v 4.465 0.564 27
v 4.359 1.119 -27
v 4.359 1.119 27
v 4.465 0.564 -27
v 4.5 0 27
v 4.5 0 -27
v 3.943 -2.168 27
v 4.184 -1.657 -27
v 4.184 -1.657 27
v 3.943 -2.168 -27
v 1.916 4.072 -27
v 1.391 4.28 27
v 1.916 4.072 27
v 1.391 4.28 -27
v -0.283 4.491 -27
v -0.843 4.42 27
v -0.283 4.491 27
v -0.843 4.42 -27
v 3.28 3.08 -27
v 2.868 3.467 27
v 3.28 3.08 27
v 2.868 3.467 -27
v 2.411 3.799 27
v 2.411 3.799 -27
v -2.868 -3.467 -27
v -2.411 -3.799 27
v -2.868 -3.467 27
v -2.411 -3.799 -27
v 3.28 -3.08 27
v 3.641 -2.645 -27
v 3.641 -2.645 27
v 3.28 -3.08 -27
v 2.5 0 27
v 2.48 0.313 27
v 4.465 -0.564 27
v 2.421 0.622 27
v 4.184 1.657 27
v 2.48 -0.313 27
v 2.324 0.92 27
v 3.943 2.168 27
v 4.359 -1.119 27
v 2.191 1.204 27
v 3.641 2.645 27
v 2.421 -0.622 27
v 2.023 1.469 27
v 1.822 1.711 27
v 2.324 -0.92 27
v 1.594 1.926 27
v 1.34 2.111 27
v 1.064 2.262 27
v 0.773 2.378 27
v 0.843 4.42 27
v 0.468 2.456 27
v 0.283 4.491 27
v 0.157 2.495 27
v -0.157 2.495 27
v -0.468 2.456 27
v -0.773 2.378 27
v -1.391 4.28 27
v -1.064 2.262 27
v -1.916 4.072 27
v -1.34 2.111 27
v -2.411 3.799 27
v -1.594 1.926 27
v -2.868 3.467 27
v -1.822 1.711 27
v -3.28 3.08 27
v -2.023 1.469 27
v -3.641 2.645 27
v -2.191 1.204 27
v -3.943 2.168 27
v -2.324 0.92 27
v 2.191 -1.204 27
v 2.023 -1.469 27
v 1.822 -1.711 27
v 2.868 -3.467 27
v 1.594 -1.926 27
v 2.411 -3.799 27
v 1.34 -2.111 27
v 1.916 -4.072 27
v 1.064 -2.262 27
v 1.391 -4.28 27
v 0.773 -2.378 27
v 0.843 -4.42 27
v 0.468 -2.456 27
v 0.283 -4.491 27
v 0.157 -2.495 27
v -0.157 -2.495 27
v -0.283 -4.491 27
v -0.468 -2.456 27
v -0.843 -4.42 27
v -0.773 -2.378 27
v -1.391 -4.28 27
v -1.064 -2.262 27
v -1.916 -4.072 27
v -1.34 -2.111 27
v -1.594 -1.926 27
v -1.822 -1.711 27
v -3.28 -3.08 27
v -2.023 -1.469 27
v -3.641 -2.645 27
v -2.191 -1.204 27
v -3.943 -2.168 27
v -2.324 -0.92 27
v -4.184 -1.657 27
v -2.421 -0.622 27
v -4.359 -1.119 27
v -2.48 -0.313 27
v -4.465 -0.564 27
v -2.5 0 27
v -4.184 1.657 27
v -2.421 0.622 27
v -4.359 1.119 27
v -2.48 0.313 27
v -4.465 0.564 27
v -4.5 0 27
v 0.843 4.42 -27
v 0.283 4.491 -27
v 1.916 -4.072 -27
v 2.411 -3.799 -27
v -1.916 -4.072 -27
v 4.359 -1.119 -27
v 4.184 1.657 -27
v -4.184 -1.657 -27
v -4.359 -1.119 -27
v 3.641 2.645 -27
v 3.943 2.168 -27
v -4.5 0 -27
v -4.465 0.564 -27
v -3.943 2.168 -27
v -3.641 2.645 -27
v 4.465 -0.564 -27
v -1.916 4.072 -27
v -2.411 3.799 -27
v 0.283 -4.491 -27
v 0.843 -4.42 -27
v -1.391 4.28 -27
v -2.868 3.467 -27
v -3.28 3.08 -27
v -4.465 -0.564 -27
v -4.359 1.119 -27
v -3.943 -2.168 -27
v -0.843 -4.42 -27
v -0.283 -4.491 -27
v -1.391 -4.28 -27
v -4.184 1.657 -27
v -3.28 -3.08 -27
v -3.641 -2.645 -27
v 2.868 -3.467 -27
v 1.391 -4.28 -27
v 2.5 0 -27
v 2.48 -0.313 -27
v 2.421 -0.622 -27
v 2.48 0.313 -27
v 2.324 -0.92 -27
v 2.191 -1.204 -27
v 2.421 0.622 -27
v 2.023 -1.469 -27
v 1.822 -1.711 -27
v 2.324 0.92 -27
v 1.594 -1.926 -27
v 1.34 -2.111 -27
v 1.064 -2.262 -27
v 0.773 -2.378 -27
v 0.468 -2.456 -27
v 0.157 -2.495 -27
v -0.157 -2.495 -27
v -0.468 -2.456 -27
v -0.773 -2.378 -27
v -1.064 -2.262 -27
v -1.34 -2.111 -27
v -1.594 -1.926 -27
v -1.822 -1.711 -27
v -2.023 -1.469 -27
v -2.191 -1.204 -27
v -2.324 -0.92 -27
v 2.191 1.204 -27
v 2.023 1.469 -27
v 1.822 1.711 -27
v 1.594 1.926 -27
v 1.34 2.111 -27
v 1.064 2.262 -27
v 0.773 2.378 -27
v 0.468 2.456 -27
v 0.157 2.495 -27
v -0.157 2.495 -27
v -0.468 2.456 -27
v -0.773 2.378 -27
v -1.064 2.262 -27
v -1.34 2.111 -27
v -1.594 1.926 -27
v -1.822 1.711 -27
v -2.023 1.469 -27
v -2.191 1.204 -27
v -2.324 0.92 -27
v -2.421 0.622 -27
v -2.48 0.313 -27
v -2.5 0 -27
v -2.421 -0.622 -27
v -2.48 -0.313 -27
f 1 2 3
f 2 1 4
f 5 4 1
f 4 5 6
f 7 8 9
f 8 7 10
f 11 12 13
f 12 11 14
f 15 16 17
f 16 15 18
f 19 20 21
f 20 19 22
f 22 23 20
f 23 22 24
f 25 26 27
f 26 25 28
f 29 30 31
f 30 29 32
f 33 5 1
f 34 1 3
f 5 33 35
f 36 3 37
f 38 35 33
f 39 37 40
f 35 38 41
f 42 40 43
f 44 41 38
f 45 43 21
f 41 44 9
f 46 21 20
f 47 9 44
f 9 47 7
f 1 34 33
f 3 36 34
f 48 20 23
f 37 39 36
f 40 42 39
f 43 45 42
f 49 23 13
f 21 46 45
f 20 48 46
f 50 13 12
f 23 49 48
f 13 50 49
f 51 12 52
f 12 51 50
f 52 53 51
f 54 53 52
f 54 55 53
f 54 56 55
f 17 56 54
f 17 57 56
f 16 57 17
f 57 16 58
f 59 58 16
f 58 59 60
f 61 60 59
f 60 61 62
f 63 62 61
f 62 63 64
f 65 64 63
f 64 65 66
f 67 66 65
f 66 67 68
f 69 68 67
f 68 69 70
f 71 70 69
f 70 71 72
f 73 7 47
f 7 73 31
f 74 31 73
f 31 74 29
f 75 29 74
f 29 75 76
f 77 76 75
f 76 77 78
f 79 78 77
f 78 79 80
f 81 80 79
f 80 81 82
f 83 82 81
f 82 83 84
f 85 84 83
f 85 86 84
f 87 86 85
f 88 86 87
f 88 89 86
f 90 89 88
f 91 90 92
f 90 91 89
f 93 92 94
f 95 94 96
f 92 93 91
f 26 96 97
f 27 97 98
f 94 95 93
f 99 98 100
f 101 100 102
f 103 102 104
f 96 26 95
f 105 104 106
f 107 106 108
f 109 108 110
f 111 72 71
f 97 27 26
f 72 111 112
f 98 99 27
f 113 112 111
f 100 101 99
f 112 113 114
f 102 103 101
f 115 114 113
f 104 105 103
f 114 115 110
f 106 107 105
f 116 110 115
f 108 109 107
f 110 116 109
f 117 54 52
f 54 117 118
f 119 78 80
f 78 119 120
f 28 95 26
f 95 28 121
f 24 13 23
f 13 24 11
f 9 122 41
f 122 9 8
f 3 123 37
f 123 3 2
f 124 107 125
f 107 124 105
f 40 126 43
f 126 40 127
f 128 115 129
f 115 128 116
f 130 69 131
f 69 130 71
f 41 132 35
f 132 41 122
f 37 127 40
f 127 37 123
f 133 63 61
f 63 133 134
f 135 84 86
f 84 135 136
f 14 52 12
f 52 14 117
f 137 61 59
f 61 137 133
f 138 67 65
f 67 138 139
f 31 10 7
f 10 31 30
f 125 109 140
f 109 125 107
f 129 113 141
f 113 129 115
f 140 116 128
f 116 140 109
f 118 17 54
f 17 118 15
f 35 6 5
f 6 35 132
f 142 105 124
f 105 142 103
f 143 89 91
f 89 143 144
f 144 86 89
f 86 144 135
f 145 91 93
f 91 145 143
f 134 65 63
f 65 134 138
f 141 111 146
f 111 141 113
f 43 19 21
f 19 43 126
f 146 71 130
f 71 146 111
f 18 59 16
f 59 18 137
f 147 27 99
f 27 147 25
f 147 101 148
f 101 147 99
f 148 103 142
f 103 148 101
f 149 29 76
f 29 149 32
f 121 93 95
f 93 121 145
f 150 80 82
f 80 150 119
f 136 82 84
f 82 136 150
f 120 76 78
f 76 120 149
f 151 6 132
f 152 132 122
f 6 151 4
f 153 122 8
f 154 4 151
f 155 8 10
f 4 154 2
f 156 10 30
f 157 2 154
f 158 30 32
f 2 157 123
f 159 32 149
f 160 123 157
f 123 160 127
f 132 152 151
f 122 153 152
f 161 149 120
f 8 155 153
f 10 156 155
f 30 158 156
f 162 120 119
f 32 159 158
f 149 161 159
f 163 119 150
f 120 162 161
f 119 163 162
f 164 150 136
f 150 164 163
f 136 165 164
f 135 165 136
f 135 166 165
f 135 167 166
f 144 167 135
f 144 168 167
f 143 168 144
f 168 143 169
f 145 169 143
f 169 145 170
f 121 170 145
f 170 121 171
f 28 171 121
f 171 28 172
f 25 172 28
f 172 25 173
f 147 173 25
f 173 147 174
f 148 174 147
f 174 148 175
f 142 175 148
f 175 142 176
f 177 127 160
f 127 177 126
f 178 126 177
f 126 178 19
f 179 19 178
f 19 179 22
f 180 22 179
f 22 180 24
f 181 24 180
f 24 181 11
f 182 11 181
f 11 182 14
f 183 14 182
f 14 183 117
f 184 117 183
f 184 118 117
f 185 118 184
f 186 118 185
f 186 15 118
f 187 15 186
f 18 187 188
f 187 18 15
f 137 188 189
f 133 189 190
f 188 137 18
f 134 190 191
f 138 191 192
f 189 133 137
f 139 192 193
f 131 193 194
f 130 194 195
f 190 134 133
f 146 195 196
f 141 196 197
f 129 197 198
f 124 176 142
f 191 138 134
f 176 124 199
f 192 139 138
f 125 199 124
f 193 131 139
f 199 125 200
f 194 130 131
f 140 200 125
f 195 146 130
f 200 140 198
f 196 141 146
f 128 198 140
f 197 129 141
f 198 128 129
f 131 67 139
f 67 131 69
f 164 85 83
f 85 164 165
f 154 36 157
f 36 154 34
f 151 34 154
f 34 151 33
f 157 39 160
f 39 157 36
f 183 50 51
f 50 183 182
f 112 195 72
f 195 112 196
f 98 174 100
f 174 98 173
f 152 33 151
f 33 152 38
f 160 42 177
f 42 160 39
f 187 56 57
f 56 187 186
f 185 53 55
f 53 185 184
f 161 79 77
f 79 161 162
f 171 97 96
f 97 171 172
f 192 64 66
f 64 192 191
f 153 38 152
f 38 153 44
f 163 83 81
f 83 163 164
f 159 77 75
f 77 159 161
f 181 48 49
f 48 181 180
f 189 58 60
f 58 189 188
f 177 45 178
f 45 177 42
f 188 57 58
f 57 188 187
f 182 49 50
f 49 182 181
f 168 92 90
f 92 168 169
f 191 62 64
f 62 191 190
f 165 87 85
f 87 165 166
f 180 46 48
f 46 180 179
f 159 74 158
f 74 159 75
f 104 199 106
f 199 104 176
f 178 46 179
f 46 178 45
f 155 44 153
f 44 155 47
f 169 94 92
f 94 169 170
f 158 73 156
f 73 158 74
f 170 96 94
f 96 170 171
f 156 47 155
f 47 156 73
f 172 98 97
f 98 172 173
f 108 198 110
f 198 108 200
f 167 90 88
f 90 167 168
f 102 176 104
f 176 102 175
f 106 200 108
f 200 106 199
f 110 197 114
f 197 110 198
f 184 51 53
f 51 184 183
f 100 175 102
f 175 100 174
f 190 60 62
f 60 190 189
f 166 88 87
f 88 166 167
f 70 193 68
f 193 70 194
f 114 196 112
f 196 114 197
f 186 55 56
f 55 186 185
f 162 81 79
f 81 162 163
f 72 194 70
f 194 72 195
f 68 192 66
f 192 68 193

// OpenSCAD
$fn = 50;


difference() {
	union() {
		translate(v = [0, 0, -27.0000000000]) {
			cylinder(h = 54, r = 4.5000000000);
		}
	}
	union() {
		translate(v = [0, 0, -100.0000000000]) {
			cylinder(h = 200, r = 2.5000000000);
		}
	}
}
